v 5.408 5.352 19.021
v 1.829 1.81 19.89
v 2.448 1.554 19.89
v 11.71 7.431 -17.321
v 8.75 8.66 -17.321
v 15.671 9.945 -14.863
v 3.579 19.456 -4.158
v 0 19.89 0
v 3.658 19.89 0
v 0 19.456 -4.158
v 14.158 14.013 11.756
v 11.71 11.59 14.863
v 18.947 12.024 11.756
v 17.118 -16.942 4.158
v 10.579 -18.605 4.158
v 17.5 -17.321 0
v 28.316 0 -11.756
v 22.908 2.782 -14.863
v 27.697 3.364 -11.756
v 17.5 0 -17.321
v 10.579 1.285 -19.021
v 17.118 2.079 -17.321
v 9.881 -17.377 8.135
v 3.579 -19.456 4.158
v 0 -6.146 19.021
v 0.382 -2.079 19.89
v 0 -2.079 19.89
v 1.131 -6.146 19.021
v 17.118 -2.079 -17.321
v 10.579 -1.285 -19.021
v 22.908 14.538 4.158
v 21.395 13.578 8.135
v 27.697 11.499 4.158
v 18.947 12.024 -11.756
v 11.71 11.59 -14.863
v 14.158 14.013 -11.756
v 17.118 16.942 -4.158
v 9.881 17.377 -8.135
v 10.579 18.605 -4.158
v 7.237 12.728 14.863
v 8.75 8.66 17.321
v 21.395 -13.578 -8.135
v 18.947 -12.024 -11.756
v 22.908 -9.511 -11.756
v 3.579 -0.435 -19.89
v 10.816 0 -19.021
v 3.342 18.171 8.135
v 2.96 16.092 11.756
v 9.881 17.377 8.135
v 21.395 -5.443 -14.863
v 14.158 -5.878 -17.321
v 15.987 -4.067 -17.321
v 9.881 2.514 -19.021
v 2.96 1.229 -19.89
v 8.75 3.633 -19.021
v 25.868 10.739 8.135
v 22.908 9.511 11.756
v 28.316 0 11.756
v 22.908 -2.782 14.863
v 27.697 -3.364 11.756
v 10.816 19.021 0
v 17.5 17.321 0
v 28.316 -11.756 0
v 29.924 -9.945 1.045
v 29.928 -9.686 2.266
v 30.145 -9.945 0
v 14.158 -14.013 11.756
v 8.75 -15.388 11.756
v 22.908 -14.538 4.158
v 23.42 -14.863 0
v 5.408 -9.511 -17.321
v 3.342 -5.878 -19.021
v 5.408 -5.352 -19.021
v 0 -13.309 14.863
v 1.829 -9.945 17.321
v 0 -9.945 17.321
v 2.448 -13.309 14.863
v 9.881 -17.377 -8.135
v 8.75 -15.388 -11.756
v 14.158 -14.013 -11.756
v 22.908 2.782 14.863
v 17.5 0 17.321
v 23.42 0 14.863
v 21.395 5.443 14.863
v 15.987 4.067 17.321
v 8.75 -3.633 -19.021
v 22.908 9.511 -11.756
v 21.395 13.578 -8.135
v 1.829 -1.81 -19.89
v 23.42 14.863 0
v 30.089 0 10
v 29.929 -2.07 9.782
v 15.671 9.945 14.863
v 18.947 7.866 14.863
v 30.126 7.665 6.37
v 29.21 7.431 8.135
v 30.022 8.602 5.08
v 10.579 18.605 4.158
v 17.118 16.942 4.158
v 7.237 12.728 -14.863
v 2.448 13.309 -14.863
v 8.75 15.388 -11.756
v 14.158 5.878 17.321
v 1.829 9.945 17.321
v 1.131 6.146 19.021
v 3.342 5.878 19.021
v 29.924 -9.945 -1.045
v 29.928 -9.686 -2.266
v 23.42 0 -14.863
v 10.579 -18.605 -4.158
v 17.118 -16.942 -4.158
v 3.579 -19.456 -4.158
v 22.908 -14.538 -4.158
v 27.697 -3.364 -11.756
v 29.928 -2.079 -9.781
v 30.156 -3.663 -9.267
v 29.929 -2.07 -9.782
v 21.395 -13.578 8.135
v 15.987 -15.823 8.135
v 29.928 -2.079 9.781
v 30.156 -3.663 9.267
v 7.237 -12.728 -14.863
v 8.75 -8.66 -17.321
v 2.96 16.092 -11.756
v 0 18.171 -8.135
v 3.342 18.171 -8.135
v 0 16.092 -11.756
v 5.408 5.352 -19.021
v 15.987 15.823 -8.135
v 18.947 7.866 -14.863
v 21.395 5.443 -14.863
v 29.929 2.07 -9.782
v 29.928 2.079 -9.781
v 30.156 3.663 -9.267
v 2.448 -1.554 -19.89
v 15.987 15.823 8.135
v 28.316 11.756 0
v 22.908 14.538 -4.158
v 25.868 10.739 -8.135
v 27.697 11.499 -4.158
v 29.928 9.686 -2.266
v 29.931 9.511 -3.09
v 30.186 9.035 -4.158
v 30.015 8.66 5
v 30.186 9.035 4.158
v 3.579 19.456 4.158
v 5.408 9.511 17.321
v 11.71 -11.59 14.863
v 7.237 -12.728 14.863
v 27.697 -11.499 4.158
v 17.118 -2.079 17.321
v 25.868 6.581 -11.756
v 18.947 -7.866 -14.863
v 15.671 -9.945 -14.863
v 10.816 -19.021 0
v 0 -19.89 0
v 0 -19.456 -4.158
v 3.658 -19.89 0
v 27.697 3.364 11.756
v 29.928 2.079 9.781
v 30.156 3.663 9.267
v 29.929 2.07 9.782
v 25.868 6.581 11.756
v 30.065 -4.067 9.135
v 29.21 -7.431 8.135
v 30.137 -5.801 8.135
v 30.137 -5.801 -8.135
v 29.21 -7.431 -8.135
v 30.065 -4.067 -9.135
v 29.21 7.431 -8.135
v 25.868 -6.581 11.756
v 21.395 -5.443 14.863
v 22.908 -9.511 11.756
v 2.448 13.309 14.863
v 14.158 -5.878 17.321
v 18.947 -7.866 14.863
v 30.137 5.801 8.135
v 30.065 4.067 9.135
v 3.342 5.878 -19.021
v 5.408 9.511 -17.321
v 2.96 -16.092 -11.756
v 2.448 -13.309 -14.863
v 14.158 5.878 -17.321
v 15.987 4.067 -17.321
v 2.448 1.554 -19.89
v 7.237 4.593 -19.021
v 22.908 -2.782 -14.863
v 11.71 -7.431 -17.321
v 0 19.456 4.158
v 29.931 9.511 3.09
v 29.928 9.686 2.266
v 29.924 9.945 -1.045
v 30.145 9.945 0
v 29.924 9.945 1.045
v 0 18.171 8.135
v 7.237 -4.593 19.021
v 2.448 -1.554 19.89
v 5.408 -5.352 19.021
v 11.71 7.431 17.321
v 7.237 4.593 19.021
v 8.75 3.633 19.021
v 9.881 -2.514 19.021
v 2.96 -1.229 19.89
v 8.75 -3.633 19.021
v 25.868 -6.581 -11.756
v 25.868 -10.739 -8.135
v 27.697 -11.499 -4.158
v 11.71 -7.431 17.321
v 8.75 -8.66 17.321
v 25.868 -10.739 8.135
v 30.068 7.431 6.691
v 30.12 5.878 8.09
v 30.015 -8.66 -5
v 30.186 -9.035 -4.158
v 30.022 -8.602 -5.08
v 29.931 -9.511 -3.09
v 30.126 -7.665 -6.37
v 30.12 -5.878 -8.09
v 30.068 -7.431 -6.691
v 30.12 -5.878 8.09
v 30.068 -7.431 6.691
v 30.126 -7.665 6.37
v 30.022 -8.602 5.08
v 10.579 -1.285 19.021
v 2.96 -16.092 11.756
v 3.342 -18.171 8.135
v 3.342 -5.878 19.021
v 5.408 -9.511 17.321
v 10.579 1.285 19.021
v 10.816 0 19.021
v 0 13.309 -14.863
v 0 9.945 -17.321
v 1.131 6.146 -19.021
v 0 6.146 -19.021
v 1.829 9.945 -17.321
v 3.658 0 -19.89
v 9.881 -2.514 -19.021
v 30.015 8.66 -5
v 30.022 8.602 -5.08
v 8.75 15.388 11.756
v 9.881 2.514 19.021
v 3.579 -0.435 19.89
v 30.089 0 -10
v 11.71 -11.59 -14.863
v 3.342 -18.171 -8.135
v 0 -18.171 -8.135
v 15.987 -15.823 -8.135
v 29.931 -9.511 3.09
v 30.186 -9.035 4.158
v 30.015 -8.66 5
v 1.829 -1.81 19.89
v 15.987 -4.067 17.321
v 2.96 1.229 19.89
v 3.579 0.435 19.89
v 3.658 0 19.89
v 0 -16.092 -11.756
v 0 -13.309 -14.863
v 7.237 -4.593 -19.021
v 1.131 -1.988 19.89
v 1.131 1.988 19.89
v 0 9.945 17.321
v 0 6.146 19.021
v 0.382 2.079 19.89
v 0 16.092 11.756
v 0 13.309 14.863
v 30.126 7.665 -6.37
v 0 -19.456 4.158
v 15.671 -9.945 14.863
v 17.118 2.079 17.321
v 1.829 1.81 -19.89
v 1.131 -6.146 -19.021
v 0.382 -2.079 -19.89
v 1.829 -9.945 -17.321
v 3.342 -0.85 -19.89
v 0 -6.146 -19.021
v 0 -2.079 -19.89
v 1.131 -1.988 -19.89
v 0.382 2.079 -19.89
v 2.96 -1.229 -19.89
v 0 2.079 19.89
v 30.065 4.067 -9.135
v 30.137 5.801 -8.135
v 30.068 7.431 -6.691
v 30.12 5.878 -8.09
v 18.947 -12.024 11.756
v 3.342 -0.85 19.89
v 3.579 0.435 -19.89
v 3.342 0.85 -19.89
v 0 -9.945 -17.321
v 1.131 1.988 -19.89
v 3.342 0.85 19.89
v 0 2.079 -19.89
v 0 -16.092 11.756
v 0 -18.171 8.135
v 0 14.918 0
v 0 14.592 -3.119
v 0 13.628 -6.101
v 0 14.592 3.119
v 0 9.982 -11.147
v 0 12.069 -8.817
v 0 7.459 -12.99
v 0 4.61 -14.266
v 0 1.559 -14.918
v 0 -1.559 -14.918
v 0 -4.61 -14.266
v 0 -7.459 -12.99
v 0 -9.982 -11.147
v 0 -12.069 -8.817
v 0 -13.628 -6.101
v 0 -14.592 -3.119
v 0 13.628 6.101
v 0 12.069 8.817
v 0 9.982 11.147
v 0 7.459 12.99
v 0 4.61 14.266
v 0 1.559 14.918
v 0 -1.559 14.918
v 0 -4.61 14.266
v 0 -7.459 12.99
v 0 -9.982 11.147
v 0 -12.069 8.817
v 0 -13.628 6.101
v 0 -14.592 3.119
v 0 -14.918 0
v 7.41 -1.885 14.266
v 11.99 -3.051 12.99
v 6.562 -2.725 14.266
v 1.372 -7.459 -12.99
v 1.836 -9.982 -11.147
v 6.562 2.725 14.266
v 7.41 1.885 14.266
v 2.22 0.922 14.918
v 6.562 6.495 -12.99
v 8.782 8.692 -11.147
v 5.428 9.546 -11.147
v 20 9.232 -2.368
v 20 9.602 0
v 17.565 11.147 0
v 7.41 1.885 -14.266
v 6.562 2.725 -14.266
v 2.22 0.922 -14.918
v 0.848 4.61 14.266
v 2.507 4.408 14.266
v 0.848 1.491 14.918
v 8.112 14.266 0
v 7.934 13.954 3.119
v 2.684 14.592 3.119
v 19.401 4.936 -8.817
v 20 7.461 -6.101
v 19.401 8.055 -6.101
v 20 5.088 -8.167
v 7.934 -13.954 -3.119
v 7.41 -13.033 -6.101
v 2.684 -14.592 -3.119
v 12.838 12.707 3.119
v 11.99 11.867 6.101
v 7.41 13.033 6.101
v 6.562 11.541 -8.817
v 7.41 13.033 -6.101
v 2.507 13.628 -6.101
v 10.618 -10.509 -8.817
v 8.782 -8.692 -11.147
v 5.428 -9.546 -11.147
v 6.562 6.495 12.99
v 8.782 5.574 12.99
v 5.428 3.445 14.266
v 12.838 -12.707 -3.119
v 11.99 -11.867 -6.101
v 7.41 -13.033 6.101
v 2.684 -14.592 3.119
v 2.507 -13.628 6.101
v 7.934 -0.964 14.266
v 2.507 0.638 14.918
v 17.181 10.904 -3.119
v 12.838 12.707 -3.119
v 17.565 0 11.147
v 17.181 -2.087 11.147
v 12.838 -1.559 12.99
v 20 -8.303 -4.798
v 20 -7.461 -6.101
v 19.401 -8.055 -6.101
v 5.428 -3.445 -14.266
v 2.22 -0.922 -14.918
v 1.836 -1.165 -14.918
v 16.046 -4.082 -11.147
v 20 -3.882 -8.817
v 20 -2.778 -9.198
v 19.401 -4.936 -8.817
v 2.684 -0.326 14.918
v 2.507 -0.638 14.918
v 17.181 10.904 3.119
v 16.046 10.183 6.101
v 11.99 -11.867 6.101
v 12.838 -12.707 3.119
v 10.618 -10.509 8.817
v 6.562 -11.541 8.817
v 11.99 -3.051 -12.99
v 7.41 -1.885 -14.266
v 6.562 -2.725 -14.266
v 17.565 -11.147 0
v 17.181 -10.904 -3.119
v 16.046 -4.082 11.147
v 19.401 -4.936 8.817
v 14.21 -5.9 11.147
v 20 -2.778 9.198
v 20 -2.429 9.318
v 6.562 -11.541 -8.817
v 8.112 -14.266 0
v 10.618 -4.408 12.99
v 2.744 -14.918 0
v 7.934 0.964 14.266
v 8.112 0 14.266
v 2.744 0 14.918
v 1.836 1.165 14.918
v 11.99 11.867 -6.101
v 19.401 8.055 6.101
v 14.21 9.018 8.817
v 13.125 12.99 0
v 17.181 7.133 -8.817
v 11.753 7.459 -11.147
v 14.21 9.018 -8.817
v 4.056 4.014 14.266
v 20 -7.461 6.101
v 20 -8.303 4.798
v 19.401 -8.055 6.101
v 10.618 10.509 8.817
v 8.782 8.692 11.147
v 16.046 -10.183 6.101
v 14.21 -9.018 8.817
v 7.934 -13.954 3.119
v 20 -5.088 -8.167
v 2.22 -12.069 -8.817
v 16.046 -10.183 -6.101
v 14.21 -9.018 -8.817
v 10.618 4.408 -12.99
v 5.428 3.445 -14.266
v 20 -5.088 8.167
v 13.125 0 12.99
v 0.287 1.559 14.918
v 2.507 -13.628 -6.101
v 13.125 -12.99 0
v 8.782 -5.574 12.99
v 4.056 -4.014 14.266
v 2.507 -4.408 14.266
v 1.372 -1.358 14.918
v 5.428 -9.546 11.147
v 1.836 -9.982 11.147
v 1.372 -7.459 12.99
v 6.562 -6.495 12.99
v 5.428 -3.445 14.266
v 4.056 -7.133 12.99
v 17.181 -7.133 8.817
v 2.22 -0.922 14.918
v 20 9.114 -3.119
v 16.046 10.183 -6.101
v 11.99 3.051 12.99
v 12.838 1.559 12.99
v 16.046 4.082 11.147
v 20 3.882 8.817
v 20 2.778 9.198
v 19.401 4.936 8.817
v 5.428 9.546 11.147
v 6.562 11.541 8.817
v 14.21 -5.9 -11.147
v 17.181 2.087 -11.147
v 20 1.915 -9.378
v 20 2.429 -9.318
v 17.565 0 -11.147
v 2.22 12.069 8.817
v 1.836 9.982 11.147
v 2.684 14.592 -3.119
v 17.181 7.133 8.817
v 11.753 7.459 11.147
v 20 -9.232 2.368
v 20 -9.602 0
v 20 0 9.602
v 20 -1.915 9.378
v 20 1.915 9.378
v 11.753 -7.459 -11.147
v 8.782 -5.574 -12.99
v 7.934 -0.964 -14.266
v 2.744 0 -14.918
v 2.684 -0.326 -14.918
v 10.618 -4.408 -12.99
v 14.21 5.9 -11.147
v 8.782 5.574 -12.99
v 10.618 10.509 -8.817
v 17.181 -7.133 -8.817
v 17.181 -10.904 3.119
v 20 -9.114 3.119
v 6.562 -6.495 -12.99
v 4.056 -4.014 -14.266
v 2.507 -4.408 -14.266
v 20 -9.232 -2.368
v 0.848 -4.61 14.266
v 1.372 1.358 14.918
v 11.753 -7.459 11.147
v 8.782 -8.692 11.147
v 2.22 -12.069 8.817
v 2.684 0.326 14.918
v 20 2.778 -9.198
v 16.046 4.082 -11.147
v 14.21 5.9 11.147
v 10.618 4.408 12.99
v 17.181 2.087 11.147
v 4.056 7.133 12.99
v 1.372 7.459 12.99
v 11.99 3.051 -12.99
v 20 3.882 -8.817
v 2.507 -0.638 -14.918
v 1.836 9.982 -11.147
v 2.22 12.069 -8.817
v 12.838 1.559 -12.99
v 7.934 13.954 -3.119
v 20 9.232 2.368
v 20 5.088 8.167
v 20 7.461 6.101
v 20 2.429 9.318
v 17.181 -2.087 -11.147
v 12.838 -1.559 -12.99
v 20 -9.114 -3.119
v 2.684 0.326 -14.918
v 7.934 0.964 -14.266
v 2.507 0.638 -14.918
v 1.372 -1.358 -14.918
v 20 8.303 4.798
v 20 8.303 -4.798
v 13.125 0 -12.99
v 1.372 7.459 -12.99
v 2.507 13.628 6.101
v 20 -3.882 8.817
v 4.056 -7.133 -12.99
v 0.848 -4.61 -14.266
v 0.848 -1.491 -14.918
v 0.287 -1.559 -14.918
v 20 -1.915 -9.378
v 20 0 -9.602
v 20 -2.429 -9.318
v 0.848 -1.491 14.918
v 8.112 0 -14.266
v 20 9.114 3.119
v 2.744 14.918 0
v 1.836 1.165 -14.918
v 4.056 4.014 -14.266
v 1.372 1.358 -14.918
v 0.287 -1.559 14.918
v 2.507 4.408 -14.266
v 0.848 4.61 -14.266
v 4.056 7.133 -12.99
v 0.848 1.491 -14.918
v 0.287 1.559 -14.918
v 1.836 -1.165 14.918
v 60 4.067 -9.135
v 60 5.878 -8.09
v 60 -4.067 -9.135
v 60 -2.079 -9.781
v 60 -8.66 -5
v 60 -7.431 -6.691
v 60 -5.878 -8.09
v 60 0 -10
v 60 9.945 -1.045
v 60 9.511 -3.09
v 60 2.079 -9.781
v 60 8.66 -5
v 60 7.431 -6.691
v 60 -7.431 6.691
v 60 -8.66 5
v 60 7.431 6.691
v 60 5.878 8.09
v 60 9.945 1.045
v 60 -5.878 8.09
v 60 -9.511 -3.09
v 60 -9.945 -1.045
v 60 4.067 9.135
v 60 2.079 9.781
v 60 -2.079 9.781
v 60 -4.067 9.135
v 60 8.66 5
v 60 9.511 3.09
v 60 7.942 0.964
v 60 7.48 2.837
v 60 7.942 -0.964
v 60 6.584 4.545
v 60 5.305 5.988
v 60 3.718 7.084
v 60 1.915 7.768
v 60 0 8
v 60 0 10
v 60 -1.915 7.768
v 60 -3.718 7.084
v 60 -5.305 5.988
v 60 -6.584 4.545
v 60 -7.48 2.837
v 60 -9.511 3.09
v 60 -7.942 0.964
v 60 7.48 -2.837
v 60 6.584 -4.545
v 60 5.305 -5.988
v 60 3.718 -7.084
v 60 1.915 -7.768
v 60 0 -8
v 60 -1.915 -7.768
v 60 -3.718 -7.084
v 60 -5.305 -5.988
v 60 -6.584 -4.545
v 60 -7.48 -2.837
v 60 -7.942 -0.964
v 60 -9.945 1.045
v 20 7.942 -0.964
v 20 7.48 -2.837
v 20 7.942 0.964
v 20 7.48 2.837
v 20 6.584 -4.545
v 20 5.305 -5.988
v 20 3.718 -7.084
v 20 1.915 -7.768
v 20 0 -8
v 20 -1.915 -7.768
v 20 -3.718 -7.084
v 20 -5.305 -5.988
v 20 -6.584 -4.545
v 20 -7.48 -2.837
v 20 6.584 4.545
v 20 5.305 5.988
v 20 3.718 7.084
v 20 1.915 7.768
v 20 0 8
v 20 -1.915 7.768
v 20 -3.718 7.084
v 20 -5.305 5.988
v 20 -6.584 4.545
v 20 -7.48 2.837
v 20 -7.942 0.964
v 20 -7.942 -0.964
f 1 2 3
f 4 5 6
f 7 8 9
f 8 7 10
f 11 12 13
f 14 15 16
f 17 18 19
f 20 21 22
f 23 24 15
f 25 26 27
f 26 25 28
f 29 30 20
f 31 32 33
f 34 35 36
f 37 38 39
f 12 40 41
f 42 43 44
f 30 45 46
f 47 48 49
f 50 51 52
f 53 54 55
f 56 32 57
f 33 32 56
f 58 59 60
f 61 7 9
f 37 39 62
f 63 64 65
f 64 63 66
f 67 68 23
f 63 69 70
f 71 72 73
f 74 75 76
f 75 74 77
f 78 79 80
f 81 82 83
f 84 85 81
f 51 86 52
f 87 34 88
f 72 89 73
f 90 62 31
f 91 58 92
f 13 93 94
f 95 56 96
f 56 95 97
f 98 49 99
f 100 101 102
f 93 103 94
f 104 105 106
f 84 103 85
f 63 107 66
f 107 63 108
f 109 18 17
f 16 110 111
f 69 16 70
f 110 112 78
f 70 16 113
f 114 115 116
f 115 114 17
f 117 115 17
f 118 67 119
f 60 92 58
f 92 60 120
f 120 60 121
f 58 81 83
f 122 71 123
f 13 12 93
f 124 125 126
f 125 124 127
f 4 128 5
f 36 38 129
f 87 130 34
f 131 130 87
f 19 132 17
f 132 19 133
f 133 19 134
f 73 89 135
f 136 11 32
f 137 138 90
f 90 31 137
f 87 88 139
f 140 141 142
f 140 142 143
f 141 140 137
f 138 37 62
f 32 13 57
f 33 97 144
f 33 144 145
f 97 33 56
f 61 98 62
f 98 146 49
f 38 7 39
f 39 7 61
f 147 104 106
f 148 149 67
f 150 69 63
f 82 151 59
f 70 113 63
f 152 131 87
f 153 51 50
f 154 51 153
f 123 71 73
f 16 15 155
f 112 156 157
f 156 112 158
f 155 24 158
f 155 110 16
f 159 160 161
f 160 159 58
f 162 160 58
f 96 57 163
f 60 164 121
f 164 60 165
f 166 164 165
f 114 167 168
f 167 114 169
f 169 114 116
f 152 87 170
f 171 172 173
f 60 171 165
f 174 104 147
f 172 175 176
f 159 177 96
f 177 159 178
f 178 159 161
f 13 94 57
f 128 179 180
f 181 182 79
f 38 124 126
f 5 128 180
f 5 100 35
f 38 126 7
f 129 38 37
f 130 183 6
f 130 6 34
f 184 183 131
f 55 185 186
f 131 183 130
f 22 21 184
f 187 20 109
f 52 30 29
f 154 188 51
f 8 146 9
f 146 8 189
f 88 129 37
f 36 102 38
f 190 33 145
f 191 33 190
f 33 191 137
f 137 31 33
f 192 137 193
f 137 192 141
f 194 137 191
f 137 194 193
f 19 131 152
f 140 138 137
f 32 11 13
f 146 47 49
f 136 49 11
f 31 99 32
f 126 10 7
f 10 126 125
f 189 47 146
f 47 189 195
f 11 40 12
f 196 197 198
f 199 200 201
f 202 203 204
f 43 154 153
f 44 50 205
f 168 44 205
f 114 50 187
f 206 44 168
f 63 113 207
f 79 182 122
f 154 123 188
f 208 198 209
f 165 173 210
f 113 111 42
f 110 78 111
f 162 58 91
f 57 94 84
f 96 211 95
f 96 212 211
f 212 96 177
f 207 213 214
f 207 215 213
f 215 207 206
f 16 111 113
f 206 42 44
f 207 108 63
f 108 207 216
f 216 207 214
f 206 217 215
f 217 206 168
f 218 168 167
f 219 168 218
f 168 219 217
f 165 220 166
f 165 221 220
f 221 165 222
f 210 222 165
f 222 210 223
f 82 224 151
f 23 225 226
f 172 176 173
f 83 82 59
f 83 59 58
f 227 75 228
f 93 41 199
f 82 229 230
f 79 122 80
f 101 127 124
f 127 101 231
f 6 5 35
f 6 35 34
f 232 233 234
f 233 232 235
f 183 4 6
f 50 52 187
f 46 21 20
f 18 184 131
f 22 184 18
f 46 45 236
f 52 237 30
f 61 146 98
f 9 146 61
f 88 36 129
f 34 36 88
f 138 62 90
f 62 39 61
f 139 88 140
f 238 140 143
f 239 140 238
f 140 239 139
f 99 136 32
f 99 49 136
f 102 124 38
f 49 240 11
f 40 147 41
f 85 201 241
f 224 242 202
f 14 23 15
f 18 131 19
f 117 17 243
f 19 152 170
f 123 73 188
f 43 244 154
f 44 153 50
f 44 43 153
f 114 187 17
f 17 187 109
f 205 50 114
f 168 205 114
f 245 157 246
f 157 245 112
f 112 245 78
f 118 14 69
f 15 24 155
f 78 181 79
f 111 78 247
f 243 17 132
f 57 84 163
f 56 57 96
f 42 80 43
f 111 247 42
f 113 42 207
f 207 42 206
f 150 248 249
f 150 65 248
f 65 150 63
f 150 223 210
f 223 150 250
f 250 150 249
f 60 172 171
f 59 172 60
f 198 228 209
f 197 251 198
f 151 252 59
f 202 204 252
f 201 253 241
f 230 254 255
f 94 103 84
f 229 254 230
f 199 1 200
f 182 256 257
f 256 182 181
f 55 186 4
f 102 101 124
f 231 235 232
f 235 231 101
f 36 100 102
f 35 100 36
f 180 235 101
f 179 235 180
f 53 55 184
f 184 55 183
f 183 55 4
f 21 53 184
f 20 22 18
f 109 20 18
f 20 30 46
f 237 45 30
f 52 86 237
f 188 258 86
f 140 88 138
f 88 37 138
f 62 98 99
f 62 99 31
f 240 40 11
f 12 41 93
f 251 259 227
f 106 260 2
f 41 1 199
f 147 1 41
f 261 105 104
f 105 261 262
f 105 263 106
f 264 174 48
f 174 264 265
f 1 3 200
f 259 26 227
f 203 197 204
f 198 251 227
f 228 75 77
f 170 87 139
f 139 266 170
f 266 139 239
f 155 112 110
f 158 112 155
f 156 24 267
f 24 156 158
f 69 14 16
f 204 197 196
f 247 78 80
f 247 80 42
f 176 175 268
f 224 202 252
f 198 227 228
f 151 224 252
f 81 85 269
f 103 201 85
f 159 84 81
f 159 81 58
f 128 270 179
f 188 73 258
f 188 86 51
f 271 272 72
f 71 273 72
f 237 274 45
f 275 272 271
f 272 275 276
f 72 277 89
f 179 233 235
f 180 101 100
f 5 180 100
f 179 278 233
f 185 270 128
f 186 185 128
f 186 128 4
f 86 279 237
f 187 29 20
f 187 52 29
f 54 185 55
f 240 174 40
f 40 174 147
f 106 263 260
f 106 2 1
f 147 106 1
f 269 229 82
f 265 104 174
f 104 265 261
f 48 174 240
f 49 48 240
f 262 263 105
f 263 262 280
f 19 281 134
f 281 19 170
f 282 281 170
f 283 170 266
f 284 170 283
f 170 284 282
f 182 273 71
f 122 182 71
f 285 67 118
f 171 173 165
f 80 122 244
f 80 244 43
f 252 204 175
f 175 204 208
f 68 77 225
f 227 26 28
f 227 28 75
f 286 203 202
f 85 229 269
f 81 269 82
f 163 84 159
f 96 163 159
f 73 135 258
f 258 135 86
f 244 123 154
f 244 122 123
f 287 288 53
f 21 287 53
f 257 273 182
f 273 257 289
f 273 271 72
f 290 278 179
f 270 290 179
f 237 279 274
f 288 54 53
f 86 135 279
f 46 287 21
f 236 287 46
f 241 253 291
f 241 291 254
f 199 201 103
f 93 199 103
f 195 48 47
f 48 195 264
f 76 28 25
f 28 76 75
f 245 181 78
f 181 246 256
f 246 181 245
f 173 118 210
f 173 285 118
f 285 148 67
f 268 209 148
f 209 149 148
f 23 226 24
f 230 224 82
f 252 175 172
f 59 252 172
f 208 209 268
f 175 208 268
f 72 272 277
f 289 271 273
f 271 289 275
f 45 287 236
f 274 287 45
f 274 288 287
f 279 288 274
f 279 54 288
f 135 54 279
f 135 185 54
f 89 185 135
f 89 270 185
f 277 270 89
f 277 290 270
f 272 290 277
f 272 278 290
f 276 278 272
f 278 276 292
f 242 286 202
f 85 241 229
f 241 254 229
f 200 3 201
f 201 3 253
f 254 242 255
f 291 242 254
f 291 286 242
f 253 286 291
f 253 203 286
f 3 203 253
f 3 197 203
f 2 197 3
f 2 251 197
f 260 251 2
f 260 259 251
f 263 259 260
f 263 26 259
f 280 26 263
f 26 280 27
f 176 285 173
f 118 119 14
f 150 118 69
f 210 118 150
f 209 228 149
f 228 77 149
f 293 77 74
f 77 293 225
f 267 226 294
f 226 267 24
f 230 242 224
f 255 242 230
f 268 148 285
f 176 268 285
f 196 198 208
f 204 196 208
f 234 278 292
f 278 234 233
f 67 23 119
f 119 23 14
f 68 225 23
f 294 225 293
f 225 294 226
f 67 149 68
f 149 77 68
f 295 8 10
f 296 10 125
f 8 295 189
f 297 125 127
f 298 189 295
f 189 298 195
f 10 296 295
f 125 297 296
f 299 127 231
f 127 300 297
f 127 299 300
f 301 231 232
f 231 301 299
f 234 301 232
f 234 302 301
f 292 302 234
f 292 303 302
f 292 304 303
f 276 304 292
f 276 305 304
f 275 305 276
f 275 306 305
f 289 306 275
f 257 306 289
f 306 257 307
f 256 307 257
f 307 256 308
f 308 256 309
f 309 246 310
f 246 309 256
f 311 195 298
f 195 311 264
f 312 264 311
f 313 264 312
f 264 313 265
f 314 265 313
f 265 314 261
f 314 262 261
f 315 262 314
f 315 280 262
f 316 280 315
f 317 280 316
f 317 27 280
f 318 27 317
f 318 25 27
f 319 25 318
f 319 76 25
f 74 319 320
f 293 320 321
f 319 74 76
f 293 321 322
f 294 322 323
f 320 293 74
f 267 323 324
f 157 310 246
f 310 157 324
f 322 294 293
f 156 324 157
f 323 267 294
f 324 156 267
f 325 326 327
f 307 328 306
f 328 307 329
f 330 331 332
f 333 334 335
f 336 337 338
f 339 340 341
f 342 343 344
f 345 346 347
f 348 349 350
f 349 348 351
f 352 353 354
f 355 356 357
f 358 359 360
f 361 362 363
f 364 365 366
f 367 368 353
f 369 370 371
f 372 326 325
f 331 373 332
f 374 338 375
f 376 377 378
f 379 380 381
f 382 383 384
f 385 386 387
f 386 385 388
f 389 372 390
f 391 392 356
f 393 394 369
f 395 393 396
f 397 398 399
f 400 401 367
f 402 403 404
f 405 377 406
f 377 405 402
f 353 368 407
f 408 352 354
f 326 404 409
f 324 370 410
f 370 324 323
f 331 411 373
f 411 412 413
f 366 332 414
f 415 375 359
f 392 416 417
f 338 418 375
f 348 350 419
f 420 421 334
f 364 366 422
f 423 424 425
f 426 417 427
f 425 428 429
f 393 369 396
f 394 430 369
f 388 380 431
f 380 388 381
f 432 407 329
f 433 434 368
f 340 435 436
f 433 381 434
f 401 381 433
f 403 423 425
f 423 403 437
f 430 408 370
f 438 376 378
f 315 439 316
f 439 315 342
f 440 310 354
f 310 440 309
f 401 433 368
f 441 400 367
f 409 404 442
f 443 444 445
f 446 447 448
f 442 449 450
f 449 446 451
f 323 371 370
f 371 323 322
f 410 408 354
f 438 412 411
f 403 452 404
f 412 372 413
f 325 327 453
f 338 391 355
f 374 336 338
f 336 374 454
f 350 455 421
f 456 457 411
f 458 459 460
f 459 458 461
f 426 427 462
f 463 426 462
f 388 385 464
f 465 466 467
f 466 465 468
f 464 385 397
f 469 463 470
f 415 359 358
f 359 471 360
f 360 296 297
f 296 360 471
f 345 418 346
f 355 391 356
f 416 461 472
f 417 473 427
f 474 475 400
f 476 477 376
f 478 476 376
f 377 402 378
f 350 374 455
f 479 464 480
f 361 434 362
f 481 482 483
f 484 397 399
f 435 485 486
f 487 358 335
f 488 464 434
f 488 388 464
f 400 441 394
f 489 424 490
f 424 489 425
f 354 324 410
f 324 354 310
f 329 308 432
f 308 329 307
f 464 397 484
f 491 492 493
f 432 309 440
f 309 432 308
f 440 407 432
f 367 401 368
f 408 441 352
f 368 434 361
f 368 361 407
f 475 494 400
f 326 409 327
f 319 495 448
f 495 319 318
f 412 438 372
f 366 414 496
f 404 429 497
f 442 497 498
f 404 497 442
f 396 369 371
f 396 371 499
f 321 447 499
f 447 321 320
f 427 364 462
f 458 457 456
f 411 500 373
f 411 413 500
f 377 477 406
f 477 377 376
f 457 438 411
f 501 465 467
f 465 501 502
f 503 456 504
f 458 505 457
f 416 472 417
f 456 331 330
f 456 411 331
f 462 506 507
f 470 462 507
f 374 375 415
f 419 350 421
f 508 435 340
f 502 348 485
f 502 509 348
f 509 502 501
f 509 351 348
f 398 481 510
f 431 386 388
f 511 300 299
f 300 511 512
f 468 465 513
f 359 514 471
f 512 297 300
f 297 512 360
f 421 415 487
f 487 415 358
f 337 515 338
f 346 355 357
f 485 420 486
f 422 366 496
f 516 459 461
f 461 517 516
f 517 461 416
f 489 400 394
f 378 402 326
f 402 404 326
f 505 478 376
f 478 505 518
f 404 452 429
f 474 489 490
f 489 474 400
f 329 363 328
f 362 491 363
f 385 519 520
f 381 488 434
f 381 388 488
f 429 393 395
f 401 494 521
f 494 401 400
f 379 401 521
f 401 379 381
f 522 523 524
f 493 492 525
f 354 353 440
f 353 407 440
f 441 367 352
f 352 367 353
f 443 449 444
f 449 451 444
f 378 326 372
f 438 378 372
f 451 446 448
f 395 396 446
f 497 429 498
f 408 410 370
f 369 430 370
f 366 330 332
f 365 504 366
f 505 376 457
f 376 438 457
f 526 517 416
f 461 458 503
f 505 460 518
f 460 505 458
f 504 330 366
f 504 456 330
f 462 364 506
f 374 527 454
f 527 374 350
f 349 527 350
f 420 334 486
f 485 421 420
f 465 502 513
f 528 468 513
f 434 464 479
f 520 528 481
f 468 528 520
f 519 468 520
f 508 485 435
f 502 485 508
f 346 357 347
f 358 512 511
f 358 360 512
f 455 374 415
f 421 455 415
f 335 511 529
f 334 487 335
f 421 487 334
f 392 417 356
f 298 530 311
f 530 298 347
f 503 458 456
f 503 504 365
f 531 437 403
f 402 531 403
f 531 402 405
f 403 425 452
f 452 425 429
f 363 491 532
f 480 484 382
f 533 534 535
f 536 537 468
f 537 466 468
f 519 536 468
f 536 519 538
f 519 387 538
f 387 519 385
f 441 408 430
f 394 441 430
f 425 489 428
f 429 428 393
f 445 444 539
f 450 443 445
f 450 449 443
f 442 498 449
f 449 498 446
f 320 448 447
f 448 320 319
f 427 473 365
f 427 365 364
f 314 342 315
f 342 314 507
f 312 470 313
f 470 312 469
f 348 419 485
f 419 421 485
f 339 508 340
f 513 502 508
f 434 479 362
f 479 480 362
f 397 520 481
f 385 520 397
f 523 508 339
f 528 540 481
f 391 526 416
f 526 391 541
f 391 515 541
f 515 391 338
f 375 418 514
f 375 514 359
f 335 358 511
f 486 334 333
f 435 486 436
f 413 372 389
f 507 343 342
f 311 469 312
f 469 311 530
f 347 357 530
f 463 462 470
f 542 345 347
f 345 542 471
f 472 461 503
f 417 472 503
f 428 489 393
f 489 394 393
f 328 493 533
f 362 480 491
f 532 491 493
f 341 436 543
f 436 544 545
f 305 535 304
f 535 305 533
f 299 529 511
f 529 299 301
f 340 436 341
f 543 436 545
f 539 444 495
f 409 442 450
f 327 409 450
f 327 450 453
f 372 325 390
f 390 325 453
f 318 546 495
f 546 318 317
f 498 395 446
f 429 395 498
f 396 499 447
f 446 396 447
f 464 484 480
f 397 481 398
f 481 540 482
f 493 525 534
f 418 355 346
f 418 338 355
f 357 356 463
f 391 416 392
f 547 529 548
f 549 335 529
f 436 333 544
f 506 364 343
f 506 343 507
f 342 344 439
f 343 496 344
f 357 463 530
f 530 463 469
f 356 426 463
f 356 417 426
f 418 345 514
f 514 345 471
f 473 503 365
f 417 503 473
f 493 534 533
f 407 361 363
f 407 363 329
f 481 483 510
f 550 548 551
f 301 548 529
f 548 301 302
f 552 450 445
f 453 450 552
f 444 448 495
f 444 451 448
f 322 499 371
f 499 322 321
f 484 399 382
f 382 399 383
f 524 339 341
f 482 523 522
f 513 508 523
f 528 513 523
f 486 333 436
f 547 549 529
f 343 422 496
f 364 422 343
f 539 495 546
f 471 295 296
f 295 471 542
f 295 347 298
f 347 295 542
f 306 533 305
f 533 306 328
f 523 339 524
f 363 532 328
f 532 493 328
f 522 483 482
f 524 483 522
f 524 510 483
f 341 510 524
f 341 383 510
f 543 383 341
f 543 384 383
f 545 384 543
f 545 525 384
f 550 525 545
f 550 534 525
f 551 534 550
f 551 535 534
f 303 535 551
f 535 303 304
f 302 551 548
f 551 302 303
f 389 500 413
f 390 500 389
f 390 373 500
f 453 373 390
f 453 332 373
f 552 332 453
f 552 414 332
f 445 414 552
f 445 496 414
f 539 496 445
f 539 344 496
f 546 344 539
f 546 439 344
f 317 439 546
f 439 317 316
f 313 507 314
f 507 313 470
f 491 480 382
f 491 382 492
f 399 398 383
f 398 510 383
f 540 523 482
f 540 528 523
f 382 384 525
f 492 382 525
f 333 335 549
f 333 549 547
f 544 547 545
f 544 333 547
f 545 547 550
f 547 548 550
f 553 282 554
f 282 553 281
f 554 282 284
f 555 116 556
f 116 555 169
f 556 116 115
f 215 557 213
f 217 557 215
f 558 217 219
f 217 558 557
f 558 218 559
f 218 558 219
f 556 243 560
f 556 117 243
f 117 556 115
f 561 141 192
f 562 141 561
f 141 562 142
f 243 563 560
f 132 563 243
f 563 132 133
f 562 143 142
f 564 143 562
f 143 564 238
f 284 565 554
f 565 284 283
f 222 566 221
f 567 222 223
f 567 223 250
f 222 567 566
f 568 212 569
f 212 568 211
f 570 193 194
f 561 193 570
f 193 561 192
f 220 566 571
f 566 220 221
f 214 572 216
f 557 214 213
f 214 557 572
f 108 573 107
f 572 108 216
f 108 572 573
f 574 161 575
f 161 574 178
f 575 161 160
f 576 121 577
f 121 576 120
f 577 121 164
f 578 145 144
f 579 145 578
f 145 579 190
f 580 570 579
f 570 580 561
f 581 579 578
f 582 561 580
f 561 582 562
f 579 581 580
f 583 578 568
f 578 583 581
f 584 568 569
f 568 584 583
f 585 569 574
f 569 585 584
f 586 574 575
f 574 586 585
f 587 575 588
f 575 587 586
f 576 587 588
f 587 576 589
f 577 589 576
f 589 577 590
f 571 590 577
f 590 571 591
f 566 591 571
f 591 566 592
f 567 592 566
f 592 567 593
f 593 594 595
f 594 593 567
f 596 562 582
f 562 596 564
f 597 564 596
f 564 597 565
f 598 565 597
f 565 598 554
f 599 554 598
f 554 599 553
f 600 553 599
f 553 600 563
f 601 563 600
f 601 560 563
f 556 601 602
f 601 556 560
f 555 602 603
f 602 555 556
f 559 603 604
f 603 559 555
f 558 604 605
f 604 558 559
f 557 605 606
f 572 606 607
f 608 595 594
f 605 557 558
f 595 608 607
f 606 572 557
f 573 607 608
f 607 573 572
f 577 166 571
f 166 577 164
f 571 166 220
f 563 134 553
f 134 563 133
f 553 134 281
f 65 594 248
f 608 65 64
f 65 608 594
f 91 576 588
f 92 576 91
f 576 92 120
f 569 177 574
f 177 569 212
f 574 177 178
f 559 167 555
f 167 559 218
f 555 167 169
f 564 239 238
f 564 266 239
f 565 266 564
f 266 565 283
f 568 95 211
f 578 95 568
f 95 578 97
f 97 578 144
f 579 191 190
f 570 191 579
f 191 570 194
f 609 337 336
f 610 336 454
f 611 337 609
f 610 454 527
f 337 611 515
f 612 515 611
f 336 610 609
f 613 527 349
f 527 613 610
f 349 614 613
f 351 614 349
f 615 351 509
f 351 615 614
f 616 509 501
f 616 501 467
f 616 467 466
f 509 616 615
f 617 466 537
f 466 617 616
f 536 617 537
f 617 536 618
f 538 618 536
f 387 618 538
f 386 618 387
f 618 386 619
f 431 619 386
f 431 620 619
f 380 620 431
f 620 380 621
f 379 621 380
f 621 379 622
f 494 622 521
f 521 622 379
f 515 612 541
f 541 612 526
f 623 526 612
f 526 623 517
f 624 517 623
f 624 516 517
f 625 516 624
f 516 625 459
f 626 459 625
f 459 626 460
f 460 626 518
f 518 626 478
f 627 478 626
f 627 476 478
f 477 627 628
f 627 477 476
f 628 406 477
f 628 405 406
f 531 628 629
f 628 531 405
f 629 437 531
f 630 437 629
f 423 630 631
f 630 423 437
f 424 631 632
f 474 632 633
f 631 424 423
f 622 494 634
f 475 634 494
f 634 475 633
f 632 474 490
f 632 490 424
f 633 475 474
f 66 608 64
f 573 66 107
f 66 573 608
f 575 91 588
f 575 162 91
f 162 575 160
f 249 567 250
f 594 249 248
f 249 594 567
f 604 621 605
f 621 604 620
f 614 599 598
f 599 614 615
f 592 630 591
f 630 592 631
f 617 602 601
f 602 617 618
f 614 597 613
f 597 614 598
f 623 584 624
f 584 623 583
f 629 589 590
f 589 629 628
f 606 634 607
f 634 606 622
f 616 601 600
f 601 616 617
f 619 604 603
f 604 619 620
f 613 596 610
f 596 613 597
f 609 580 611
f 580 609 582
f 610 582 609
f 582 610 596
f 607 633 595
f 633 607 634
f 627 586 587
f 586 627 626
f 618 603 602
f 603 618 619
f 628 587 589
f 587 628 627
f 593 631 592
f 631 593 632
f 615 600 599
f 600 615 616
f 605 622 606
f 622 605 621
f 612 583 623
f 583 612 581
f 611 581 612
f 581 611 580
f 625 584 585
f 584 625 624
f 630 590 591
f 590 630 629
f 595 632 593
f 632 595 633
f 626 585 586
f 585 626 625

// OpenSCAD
difference()
{
    union()
    {
        difference()
        {
            scale([1.75,1,1])difference()
            {
                sphere(20);
                rotate([0,-90,0])translate([-20,-20,0])cube(40);
            }
            scale([1.75,1,1])sphere(15);
        }
        translate([20,0,0])rotate([0,90,0])cylinder(40,10,10);
    }
    translate([10,0,0])rotate([0,90,0])cylinder(80,8,8);
}
